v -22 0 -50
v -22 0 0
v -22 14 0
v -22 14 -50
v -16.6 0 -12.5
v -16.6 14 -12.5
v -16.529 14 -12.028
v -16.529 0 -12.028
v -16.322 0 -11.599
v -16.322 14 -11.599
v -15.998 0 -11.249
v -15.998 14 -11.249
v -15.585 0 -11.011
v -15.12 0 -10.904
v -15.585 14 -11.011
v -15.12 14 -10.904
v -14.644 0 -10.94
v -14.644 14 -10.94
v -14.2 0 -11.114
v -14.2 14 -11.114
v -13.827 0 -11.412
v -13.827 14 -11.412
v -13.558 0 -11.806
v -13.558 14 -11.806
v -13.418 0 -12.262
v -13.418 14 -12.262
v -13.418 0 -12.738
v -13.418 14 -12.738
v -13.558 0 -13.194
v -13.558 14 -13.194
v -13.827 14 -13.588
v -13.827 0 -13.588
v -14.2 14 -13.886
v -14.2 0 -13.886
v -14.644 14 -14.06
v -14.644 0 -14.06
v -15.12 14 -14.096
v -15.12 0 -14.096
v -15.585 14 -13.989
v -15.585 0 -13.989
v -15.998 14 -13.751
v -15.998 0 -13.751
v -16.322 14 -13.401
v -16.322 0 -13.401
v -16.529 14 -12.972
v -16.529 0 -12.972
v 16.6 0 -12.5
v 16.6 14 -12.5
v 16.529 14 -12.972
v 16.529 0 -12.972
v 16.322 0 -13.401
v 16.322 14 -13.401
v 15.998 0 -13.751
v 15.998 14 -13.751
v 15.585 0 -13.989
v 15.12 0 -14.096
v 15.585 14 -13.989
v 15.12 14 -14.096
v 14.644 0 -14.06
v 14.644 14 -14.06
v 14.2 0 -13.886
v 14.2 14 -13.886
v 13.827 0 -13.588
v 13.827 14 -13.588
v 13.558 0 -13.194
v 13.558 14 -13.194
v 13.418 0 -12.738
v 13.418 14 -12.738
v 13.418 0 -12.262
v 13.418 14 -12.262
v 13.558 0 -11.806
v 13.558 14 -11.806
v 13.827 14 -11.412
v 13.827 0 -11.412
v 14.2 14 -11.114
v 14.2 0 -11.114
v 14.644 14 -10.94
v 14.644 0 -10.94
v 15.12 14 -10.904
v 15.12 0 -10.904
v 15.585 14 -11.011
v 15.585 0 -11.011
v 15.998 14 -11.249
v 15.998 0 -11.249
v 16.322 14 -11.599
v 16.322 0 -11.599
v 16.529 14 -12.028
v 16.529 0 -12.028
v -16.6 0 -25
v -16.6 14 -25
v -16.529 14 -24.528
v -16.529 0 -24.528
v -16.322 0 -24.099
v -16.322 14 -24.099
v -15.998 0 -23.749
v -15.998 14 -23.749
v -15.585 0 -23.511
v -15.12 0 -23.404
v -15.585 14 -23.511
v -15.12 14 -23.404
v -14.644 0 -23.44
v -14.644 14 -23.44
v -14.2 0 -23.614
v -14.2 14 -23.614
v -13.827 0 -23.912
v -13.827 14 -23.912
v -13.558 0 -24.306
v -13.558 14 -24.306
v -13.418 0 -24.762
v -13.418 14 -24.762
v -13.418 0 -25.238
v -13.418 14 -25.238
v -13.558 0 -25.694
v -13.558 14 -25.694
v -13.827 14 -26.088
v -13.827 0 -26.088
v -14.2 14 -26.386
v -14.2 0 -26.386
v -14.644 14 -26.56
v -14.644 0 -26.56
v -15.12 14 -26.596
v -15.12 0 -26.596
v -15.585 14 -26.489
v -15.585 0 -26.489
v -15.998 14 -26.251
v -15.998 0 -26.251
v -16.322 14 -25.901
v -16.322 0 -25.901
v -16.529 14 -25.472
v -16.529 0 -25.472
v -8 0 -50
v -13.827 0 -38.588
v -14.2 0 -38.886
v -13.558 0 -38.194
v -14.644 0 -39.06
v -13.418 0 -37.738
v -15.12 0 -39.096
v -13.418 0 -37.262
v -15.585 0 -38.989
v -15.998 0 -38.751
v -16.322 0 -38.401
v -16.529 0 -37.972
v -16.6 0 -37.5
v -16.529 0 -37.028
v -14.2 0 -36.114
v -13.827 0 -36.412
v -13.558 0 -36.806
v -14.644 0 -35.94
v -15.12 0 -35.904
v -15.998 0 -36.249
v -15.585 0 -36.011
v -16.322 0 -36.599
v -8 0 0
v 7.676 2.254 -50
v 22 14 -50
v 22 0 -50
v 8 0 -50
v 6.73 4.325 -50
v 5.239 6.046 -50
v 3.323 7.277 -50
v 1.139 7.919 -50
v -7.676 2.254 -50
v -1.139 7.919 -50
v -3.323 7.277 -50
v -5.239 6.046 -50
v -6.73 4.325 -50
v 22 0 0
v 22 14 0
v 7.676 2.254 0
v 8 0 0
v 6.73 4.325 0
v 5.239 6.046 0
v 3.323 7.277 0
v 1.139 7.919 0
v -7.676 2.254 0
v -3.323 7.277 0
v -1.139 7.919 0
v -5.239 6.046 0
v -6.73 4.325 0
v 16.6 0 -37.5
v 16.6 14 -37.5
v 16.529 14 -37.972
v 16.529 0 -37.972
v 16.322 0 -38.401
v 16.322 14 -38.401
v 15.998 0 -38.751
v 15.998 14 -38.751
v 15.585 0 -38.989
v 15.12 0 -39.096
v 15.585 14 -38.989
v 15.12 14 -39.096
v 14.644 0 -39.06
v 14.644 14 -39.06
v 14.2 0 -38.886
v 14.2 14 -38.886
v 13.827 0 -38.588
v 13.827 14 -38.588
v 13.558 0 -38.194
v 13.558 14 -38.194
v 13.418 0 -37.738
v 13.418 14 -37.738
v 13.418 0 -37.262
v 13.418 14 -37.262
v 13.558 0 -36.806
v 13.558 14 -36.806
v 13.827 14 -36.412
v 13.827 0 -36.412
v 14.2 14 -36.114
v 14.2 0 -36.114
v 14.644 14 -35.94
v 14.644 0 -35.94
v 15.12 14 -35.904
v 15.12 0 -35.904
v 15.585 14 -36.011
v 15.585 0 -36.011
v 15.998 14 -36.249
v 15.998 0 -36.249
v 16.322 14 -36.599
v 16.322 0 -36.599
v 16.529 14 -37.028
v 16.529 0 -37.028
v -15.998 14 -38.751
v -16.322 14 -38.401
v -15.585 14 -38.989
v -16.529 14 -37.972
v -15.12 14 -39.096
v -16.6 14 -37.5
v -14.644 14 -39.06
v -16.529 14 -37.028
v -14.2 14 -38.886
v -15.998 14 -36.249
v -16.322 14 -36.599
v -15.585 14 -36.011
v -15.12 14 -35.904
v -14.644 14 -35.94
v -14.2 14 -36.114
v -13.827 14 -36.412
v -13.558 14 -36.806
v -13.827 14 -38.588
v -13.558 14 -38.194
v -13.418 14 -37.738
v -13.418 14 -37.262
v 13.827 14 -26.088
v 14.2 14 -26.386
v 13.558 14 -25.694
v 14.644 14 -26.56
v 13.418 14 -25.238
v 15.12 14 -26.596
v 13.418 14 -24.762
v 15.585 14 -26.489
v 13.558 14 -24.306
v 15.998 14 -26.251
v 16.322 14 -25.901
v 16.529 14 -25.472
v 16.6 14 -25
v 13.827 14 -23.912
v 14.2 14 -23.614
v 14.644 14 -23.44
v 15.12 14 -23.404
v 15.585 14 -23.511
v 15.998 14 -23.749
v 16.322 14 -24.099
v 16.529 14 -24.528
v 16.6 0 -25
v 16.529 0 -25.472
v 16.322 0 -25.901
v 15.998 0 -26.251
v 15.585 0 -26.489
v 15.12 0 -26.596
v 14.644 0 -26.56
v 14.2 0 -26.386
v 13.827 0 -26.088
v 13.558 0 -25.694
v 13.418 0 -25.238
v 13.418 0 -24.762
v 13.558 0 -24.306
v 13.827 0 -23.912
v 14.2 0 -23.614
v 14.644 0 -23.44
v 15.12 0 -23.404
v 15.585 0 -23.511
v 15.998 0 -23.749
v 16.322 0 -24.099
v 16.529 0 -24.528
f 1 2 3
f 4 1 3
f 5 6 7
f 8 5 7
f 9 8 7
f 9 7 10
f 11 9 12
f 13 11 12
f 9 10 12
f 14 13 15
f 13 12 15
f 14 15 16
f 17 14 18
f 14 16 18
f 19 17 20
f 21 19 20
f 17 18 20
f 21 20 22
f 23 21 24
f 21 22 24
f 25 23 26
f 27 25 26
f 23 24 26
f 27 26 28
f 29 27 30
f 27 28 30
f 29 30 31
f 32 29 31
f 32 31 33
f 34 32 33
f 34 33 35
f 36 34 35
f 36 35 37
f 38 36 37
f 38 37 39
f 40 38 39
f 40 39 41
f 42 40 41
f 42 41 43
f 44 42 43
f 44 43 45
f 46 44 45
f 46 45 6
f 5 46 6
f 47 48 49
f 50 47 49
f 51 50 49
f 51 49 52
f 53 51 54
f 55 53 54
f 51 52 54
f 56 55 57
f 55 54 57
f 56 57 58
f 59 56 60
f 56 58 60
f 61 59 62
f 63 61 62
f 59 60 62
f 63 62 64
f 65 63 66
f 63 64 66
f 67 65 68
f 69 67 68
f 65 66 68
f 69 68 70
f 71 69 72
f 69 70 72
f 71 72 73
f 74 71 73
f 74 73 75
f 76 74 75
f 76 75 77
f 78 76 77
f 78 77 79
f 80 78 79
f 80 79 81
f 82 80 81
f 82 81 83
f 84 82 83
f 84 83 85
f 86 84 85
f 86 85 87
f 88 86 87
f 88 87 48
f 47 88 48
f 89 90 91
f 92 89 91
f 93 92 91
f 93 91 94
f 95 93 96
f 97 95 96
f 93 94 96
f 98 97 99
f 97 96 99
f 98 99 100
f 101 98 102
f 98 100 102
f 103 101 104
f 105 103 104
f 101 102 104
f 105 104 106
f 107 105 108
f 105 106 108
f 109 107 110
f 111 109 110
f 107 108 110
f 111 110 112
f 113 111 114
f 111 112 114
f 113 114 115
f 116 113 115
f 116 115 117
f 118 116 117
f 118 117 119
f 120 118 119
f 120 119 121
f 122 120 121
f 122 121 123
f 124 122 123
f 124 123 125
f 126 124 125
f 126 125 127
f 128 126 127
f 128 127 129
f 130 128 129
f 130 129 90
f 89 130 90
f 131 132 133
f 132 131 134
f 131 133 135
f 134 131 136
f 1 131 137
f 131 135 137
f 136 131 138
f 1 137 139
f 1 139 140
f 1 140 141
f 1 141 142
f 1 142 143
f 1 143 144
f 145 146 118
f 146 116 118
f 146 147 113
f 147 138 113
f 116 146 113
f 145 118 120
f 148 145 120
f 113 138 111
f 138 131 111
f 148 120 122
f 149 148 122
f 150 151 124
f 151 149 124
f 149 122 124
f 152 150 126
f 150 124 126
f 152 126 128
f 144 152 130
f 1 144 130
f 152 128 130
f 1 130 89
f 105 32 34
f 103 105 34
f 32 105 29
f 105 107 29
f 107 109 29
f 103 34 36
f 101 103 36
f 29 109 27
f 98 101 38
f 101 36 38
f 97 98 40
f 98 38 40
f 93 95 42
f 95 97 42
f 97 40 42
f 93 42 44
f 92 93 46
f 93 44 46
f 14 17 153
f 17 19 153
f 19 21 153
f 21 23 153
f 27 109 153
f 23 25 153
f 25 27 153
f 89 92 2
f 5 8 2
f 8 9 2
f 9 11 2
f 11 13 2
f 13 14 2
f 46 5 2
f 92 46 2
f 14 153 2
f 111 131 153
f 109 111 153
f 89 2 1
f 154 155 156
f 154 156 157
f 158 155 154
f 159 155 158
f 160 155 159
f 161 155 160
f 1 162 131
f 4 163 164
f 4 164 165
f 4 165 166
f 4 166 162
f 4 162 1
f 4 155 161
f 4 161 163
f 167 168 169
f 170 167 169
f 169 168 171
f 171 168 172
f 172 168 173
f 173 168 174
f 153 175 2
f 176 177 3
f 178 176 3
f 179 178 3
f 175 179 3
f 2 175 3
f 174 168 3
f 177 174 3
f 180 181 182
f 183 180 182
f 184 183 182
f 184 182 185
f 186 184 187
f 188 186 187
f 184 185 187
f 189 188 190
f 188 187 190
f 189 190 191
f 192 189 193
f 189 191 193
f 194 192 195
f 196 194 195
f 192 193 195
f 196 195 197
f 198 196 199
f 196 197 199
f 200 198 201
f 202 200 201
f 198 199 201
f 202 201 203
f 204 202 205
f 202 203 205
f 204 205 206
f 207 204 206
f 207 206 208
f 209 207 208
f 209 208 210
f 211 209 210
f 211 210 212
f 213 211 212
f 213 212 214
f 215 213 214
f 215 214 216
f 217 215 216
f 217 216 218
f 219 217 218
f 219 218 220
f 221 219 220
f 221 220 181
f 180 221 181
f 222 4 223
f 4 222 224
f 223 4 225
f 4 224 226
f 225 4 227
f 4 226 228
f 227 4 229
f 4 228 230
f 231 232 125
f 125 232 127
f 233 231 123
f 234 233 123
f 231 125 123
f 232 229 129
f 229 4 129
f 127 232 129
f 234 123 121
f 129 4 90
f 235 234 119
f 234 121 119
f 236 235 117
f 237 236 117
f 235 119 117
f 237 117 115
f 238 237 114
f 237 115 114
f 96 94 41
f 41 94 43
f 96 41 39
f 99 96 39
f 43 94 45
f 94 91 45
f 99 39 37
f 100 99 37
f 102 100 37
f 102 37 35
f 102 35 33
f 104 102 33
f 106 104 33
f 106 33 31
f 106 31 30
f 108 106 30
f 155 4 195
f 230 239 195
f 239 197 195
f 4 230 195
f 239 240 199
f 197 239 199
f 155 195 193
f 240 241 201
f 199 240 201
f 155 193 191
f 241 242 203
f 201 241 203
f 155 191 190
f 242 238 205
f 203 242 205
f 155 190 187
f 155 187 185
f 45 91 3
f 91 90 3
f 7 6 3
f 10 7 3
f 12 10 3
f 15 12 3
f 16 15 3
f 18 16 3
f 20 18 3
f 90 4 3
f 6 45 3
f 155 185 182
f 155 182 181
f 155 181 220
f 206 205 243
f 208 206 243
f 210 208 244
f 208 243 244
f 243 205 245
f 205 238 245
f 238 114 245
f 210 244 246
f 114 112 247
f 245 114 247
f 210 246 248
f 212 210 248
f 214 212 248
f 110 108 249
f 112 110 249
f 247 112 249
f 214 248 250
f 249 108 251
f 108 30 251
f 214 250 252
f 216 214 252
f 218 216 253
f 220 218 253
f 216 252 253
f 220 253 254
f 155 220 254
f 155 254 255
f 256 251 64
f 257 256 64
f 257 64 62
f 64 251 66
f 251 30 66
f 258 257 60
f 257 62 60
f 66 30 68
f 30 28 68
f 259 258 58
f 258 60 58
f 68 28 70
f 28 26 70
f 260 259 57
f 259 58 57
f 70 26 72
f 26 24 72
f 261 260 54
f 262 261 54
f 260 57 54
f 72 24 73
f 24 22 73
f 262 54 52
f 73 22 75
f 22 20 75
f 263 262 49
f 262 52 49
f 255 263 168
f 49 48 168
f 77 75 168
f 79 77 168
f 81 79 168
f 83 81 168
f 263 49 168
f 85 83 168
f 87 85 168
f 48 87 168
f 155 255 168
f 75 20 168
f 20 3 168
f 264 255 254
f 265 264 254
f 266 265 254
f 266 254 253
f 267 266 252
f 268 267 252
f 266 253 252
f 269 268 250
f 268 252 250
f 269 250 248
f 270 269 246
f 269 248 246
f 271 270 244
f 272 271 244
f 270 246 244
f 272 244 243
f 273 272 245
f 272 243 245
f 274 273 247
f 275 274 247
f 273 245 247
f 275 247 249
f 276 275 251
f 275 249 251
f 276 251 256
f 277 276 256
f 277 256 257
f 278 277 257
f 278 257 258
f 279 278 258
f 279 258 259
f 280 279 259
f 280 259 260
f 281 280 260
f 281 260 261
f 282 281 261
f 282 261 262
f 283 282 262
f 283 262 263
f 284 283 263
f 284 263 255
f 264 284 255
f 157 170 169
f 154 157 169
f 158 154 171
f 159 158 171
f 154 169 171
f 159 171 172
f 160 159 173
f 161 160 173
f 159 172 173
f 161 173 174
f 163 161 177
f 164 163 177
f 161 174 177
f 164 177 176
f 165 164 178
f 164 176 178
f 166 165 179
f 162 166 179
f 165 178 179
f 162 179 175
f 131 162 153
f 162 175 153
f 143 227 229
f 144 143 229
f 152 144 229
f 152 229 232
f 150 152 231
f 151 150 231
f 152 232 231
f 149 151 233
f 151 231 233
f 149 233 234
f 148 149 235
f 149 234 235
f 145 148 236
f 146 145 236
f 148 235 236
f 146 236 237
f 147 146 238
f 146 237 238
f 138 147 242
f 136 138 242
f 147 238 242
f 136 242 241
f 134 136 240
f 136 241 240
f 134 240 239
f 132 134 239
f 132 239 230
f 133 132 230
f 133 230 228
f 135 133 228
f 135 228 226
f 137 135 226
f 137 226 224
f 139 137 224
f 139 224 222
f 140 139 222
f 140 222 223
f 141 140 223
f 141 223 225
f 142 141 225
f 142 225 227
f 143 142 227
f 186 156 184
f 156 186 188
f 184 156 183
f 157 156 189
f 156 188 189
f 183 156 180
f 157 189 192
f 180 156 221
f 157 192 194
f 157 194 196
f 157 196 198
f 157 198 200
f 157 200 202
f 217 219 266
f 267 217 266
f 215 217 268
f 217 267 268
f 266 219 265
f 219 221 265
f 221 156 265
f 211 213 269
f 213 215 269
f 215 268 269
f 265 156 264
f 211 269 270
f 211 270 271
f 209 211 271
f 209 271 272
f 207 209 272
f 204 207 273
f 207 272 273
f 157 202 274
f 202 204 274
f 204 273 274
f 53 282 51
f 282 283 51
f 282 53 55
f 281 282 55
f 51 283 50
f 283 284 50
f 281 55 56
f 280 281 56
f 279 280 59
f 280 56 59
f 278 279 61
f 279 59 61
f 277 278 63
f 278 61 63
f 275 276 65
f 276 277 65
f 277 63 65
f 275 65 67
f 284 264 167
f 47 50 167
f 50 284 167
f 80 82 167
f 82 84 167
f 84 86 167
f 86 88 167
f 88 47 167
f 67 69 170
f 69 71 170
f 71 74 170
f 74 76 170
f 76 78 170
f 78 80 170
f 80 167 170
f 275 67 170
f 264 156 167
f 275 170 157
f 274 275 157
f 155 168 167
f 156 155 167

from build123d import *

# Parameters (mm, degrees)
Y_KSEKLIK_EKSTR_ZYON1_DEPTH = 50
IZIM2_R                     = 1.6
KES_EKSTR_ZYON1_DEPTH       = 57.391488719


with BuildPart() as part:
    # Çizim1 → Yükseklik-Ekstrüzyon1 (new body)
    with BuildSketch(Plane.XY):
        with BuildLine():
            Line((-8, 0), (-22, 0))
            Line((-22, 0), (-22, 14))
            Line((-22, 14), (22, 14))
            Line((22, 14), (22, 0))
            Line((22, 0), (8, 0))
            ThreePointArc((8, 0), (0, 8), (-8, 0))
        make_face()
    extrude(amount=-Y_KSEKLIK_EKSTR_ZYON1_DEPTH)

    # Çizim2 → Kes-Ekstrüzyon1 (cut, through all)
    with BuildSketch(Plane(origin=(0, 14, 0), x_dir=(1, 0, 0), z_dir=(0, 1, 0))):
        with Locations(Location((-15, 25, 0), (0, 0, 180))):
            Circle(IZIM2_R)
        with Locations(Location((-15, 37.5, 0), (0, 0, 180))):
            Circle(IZIM2_R)
        with Locations(Location((-15, 12.5, 0), (0, 0, 180))):
            Circle(IZIM2_R)
        with Locations((15, 12.5)):
            Circle(IZIM2_R)
        with Locations((15, 37.5)):
            Circle(IZIM2_R)
        with Locations((15, 25)):
            Circle(IZIM2_R)
    extrude(amount=-KES_EKSTR_ZYON1_DEPTH, mode=Mode.SUBTRACT)


solid = part.part
